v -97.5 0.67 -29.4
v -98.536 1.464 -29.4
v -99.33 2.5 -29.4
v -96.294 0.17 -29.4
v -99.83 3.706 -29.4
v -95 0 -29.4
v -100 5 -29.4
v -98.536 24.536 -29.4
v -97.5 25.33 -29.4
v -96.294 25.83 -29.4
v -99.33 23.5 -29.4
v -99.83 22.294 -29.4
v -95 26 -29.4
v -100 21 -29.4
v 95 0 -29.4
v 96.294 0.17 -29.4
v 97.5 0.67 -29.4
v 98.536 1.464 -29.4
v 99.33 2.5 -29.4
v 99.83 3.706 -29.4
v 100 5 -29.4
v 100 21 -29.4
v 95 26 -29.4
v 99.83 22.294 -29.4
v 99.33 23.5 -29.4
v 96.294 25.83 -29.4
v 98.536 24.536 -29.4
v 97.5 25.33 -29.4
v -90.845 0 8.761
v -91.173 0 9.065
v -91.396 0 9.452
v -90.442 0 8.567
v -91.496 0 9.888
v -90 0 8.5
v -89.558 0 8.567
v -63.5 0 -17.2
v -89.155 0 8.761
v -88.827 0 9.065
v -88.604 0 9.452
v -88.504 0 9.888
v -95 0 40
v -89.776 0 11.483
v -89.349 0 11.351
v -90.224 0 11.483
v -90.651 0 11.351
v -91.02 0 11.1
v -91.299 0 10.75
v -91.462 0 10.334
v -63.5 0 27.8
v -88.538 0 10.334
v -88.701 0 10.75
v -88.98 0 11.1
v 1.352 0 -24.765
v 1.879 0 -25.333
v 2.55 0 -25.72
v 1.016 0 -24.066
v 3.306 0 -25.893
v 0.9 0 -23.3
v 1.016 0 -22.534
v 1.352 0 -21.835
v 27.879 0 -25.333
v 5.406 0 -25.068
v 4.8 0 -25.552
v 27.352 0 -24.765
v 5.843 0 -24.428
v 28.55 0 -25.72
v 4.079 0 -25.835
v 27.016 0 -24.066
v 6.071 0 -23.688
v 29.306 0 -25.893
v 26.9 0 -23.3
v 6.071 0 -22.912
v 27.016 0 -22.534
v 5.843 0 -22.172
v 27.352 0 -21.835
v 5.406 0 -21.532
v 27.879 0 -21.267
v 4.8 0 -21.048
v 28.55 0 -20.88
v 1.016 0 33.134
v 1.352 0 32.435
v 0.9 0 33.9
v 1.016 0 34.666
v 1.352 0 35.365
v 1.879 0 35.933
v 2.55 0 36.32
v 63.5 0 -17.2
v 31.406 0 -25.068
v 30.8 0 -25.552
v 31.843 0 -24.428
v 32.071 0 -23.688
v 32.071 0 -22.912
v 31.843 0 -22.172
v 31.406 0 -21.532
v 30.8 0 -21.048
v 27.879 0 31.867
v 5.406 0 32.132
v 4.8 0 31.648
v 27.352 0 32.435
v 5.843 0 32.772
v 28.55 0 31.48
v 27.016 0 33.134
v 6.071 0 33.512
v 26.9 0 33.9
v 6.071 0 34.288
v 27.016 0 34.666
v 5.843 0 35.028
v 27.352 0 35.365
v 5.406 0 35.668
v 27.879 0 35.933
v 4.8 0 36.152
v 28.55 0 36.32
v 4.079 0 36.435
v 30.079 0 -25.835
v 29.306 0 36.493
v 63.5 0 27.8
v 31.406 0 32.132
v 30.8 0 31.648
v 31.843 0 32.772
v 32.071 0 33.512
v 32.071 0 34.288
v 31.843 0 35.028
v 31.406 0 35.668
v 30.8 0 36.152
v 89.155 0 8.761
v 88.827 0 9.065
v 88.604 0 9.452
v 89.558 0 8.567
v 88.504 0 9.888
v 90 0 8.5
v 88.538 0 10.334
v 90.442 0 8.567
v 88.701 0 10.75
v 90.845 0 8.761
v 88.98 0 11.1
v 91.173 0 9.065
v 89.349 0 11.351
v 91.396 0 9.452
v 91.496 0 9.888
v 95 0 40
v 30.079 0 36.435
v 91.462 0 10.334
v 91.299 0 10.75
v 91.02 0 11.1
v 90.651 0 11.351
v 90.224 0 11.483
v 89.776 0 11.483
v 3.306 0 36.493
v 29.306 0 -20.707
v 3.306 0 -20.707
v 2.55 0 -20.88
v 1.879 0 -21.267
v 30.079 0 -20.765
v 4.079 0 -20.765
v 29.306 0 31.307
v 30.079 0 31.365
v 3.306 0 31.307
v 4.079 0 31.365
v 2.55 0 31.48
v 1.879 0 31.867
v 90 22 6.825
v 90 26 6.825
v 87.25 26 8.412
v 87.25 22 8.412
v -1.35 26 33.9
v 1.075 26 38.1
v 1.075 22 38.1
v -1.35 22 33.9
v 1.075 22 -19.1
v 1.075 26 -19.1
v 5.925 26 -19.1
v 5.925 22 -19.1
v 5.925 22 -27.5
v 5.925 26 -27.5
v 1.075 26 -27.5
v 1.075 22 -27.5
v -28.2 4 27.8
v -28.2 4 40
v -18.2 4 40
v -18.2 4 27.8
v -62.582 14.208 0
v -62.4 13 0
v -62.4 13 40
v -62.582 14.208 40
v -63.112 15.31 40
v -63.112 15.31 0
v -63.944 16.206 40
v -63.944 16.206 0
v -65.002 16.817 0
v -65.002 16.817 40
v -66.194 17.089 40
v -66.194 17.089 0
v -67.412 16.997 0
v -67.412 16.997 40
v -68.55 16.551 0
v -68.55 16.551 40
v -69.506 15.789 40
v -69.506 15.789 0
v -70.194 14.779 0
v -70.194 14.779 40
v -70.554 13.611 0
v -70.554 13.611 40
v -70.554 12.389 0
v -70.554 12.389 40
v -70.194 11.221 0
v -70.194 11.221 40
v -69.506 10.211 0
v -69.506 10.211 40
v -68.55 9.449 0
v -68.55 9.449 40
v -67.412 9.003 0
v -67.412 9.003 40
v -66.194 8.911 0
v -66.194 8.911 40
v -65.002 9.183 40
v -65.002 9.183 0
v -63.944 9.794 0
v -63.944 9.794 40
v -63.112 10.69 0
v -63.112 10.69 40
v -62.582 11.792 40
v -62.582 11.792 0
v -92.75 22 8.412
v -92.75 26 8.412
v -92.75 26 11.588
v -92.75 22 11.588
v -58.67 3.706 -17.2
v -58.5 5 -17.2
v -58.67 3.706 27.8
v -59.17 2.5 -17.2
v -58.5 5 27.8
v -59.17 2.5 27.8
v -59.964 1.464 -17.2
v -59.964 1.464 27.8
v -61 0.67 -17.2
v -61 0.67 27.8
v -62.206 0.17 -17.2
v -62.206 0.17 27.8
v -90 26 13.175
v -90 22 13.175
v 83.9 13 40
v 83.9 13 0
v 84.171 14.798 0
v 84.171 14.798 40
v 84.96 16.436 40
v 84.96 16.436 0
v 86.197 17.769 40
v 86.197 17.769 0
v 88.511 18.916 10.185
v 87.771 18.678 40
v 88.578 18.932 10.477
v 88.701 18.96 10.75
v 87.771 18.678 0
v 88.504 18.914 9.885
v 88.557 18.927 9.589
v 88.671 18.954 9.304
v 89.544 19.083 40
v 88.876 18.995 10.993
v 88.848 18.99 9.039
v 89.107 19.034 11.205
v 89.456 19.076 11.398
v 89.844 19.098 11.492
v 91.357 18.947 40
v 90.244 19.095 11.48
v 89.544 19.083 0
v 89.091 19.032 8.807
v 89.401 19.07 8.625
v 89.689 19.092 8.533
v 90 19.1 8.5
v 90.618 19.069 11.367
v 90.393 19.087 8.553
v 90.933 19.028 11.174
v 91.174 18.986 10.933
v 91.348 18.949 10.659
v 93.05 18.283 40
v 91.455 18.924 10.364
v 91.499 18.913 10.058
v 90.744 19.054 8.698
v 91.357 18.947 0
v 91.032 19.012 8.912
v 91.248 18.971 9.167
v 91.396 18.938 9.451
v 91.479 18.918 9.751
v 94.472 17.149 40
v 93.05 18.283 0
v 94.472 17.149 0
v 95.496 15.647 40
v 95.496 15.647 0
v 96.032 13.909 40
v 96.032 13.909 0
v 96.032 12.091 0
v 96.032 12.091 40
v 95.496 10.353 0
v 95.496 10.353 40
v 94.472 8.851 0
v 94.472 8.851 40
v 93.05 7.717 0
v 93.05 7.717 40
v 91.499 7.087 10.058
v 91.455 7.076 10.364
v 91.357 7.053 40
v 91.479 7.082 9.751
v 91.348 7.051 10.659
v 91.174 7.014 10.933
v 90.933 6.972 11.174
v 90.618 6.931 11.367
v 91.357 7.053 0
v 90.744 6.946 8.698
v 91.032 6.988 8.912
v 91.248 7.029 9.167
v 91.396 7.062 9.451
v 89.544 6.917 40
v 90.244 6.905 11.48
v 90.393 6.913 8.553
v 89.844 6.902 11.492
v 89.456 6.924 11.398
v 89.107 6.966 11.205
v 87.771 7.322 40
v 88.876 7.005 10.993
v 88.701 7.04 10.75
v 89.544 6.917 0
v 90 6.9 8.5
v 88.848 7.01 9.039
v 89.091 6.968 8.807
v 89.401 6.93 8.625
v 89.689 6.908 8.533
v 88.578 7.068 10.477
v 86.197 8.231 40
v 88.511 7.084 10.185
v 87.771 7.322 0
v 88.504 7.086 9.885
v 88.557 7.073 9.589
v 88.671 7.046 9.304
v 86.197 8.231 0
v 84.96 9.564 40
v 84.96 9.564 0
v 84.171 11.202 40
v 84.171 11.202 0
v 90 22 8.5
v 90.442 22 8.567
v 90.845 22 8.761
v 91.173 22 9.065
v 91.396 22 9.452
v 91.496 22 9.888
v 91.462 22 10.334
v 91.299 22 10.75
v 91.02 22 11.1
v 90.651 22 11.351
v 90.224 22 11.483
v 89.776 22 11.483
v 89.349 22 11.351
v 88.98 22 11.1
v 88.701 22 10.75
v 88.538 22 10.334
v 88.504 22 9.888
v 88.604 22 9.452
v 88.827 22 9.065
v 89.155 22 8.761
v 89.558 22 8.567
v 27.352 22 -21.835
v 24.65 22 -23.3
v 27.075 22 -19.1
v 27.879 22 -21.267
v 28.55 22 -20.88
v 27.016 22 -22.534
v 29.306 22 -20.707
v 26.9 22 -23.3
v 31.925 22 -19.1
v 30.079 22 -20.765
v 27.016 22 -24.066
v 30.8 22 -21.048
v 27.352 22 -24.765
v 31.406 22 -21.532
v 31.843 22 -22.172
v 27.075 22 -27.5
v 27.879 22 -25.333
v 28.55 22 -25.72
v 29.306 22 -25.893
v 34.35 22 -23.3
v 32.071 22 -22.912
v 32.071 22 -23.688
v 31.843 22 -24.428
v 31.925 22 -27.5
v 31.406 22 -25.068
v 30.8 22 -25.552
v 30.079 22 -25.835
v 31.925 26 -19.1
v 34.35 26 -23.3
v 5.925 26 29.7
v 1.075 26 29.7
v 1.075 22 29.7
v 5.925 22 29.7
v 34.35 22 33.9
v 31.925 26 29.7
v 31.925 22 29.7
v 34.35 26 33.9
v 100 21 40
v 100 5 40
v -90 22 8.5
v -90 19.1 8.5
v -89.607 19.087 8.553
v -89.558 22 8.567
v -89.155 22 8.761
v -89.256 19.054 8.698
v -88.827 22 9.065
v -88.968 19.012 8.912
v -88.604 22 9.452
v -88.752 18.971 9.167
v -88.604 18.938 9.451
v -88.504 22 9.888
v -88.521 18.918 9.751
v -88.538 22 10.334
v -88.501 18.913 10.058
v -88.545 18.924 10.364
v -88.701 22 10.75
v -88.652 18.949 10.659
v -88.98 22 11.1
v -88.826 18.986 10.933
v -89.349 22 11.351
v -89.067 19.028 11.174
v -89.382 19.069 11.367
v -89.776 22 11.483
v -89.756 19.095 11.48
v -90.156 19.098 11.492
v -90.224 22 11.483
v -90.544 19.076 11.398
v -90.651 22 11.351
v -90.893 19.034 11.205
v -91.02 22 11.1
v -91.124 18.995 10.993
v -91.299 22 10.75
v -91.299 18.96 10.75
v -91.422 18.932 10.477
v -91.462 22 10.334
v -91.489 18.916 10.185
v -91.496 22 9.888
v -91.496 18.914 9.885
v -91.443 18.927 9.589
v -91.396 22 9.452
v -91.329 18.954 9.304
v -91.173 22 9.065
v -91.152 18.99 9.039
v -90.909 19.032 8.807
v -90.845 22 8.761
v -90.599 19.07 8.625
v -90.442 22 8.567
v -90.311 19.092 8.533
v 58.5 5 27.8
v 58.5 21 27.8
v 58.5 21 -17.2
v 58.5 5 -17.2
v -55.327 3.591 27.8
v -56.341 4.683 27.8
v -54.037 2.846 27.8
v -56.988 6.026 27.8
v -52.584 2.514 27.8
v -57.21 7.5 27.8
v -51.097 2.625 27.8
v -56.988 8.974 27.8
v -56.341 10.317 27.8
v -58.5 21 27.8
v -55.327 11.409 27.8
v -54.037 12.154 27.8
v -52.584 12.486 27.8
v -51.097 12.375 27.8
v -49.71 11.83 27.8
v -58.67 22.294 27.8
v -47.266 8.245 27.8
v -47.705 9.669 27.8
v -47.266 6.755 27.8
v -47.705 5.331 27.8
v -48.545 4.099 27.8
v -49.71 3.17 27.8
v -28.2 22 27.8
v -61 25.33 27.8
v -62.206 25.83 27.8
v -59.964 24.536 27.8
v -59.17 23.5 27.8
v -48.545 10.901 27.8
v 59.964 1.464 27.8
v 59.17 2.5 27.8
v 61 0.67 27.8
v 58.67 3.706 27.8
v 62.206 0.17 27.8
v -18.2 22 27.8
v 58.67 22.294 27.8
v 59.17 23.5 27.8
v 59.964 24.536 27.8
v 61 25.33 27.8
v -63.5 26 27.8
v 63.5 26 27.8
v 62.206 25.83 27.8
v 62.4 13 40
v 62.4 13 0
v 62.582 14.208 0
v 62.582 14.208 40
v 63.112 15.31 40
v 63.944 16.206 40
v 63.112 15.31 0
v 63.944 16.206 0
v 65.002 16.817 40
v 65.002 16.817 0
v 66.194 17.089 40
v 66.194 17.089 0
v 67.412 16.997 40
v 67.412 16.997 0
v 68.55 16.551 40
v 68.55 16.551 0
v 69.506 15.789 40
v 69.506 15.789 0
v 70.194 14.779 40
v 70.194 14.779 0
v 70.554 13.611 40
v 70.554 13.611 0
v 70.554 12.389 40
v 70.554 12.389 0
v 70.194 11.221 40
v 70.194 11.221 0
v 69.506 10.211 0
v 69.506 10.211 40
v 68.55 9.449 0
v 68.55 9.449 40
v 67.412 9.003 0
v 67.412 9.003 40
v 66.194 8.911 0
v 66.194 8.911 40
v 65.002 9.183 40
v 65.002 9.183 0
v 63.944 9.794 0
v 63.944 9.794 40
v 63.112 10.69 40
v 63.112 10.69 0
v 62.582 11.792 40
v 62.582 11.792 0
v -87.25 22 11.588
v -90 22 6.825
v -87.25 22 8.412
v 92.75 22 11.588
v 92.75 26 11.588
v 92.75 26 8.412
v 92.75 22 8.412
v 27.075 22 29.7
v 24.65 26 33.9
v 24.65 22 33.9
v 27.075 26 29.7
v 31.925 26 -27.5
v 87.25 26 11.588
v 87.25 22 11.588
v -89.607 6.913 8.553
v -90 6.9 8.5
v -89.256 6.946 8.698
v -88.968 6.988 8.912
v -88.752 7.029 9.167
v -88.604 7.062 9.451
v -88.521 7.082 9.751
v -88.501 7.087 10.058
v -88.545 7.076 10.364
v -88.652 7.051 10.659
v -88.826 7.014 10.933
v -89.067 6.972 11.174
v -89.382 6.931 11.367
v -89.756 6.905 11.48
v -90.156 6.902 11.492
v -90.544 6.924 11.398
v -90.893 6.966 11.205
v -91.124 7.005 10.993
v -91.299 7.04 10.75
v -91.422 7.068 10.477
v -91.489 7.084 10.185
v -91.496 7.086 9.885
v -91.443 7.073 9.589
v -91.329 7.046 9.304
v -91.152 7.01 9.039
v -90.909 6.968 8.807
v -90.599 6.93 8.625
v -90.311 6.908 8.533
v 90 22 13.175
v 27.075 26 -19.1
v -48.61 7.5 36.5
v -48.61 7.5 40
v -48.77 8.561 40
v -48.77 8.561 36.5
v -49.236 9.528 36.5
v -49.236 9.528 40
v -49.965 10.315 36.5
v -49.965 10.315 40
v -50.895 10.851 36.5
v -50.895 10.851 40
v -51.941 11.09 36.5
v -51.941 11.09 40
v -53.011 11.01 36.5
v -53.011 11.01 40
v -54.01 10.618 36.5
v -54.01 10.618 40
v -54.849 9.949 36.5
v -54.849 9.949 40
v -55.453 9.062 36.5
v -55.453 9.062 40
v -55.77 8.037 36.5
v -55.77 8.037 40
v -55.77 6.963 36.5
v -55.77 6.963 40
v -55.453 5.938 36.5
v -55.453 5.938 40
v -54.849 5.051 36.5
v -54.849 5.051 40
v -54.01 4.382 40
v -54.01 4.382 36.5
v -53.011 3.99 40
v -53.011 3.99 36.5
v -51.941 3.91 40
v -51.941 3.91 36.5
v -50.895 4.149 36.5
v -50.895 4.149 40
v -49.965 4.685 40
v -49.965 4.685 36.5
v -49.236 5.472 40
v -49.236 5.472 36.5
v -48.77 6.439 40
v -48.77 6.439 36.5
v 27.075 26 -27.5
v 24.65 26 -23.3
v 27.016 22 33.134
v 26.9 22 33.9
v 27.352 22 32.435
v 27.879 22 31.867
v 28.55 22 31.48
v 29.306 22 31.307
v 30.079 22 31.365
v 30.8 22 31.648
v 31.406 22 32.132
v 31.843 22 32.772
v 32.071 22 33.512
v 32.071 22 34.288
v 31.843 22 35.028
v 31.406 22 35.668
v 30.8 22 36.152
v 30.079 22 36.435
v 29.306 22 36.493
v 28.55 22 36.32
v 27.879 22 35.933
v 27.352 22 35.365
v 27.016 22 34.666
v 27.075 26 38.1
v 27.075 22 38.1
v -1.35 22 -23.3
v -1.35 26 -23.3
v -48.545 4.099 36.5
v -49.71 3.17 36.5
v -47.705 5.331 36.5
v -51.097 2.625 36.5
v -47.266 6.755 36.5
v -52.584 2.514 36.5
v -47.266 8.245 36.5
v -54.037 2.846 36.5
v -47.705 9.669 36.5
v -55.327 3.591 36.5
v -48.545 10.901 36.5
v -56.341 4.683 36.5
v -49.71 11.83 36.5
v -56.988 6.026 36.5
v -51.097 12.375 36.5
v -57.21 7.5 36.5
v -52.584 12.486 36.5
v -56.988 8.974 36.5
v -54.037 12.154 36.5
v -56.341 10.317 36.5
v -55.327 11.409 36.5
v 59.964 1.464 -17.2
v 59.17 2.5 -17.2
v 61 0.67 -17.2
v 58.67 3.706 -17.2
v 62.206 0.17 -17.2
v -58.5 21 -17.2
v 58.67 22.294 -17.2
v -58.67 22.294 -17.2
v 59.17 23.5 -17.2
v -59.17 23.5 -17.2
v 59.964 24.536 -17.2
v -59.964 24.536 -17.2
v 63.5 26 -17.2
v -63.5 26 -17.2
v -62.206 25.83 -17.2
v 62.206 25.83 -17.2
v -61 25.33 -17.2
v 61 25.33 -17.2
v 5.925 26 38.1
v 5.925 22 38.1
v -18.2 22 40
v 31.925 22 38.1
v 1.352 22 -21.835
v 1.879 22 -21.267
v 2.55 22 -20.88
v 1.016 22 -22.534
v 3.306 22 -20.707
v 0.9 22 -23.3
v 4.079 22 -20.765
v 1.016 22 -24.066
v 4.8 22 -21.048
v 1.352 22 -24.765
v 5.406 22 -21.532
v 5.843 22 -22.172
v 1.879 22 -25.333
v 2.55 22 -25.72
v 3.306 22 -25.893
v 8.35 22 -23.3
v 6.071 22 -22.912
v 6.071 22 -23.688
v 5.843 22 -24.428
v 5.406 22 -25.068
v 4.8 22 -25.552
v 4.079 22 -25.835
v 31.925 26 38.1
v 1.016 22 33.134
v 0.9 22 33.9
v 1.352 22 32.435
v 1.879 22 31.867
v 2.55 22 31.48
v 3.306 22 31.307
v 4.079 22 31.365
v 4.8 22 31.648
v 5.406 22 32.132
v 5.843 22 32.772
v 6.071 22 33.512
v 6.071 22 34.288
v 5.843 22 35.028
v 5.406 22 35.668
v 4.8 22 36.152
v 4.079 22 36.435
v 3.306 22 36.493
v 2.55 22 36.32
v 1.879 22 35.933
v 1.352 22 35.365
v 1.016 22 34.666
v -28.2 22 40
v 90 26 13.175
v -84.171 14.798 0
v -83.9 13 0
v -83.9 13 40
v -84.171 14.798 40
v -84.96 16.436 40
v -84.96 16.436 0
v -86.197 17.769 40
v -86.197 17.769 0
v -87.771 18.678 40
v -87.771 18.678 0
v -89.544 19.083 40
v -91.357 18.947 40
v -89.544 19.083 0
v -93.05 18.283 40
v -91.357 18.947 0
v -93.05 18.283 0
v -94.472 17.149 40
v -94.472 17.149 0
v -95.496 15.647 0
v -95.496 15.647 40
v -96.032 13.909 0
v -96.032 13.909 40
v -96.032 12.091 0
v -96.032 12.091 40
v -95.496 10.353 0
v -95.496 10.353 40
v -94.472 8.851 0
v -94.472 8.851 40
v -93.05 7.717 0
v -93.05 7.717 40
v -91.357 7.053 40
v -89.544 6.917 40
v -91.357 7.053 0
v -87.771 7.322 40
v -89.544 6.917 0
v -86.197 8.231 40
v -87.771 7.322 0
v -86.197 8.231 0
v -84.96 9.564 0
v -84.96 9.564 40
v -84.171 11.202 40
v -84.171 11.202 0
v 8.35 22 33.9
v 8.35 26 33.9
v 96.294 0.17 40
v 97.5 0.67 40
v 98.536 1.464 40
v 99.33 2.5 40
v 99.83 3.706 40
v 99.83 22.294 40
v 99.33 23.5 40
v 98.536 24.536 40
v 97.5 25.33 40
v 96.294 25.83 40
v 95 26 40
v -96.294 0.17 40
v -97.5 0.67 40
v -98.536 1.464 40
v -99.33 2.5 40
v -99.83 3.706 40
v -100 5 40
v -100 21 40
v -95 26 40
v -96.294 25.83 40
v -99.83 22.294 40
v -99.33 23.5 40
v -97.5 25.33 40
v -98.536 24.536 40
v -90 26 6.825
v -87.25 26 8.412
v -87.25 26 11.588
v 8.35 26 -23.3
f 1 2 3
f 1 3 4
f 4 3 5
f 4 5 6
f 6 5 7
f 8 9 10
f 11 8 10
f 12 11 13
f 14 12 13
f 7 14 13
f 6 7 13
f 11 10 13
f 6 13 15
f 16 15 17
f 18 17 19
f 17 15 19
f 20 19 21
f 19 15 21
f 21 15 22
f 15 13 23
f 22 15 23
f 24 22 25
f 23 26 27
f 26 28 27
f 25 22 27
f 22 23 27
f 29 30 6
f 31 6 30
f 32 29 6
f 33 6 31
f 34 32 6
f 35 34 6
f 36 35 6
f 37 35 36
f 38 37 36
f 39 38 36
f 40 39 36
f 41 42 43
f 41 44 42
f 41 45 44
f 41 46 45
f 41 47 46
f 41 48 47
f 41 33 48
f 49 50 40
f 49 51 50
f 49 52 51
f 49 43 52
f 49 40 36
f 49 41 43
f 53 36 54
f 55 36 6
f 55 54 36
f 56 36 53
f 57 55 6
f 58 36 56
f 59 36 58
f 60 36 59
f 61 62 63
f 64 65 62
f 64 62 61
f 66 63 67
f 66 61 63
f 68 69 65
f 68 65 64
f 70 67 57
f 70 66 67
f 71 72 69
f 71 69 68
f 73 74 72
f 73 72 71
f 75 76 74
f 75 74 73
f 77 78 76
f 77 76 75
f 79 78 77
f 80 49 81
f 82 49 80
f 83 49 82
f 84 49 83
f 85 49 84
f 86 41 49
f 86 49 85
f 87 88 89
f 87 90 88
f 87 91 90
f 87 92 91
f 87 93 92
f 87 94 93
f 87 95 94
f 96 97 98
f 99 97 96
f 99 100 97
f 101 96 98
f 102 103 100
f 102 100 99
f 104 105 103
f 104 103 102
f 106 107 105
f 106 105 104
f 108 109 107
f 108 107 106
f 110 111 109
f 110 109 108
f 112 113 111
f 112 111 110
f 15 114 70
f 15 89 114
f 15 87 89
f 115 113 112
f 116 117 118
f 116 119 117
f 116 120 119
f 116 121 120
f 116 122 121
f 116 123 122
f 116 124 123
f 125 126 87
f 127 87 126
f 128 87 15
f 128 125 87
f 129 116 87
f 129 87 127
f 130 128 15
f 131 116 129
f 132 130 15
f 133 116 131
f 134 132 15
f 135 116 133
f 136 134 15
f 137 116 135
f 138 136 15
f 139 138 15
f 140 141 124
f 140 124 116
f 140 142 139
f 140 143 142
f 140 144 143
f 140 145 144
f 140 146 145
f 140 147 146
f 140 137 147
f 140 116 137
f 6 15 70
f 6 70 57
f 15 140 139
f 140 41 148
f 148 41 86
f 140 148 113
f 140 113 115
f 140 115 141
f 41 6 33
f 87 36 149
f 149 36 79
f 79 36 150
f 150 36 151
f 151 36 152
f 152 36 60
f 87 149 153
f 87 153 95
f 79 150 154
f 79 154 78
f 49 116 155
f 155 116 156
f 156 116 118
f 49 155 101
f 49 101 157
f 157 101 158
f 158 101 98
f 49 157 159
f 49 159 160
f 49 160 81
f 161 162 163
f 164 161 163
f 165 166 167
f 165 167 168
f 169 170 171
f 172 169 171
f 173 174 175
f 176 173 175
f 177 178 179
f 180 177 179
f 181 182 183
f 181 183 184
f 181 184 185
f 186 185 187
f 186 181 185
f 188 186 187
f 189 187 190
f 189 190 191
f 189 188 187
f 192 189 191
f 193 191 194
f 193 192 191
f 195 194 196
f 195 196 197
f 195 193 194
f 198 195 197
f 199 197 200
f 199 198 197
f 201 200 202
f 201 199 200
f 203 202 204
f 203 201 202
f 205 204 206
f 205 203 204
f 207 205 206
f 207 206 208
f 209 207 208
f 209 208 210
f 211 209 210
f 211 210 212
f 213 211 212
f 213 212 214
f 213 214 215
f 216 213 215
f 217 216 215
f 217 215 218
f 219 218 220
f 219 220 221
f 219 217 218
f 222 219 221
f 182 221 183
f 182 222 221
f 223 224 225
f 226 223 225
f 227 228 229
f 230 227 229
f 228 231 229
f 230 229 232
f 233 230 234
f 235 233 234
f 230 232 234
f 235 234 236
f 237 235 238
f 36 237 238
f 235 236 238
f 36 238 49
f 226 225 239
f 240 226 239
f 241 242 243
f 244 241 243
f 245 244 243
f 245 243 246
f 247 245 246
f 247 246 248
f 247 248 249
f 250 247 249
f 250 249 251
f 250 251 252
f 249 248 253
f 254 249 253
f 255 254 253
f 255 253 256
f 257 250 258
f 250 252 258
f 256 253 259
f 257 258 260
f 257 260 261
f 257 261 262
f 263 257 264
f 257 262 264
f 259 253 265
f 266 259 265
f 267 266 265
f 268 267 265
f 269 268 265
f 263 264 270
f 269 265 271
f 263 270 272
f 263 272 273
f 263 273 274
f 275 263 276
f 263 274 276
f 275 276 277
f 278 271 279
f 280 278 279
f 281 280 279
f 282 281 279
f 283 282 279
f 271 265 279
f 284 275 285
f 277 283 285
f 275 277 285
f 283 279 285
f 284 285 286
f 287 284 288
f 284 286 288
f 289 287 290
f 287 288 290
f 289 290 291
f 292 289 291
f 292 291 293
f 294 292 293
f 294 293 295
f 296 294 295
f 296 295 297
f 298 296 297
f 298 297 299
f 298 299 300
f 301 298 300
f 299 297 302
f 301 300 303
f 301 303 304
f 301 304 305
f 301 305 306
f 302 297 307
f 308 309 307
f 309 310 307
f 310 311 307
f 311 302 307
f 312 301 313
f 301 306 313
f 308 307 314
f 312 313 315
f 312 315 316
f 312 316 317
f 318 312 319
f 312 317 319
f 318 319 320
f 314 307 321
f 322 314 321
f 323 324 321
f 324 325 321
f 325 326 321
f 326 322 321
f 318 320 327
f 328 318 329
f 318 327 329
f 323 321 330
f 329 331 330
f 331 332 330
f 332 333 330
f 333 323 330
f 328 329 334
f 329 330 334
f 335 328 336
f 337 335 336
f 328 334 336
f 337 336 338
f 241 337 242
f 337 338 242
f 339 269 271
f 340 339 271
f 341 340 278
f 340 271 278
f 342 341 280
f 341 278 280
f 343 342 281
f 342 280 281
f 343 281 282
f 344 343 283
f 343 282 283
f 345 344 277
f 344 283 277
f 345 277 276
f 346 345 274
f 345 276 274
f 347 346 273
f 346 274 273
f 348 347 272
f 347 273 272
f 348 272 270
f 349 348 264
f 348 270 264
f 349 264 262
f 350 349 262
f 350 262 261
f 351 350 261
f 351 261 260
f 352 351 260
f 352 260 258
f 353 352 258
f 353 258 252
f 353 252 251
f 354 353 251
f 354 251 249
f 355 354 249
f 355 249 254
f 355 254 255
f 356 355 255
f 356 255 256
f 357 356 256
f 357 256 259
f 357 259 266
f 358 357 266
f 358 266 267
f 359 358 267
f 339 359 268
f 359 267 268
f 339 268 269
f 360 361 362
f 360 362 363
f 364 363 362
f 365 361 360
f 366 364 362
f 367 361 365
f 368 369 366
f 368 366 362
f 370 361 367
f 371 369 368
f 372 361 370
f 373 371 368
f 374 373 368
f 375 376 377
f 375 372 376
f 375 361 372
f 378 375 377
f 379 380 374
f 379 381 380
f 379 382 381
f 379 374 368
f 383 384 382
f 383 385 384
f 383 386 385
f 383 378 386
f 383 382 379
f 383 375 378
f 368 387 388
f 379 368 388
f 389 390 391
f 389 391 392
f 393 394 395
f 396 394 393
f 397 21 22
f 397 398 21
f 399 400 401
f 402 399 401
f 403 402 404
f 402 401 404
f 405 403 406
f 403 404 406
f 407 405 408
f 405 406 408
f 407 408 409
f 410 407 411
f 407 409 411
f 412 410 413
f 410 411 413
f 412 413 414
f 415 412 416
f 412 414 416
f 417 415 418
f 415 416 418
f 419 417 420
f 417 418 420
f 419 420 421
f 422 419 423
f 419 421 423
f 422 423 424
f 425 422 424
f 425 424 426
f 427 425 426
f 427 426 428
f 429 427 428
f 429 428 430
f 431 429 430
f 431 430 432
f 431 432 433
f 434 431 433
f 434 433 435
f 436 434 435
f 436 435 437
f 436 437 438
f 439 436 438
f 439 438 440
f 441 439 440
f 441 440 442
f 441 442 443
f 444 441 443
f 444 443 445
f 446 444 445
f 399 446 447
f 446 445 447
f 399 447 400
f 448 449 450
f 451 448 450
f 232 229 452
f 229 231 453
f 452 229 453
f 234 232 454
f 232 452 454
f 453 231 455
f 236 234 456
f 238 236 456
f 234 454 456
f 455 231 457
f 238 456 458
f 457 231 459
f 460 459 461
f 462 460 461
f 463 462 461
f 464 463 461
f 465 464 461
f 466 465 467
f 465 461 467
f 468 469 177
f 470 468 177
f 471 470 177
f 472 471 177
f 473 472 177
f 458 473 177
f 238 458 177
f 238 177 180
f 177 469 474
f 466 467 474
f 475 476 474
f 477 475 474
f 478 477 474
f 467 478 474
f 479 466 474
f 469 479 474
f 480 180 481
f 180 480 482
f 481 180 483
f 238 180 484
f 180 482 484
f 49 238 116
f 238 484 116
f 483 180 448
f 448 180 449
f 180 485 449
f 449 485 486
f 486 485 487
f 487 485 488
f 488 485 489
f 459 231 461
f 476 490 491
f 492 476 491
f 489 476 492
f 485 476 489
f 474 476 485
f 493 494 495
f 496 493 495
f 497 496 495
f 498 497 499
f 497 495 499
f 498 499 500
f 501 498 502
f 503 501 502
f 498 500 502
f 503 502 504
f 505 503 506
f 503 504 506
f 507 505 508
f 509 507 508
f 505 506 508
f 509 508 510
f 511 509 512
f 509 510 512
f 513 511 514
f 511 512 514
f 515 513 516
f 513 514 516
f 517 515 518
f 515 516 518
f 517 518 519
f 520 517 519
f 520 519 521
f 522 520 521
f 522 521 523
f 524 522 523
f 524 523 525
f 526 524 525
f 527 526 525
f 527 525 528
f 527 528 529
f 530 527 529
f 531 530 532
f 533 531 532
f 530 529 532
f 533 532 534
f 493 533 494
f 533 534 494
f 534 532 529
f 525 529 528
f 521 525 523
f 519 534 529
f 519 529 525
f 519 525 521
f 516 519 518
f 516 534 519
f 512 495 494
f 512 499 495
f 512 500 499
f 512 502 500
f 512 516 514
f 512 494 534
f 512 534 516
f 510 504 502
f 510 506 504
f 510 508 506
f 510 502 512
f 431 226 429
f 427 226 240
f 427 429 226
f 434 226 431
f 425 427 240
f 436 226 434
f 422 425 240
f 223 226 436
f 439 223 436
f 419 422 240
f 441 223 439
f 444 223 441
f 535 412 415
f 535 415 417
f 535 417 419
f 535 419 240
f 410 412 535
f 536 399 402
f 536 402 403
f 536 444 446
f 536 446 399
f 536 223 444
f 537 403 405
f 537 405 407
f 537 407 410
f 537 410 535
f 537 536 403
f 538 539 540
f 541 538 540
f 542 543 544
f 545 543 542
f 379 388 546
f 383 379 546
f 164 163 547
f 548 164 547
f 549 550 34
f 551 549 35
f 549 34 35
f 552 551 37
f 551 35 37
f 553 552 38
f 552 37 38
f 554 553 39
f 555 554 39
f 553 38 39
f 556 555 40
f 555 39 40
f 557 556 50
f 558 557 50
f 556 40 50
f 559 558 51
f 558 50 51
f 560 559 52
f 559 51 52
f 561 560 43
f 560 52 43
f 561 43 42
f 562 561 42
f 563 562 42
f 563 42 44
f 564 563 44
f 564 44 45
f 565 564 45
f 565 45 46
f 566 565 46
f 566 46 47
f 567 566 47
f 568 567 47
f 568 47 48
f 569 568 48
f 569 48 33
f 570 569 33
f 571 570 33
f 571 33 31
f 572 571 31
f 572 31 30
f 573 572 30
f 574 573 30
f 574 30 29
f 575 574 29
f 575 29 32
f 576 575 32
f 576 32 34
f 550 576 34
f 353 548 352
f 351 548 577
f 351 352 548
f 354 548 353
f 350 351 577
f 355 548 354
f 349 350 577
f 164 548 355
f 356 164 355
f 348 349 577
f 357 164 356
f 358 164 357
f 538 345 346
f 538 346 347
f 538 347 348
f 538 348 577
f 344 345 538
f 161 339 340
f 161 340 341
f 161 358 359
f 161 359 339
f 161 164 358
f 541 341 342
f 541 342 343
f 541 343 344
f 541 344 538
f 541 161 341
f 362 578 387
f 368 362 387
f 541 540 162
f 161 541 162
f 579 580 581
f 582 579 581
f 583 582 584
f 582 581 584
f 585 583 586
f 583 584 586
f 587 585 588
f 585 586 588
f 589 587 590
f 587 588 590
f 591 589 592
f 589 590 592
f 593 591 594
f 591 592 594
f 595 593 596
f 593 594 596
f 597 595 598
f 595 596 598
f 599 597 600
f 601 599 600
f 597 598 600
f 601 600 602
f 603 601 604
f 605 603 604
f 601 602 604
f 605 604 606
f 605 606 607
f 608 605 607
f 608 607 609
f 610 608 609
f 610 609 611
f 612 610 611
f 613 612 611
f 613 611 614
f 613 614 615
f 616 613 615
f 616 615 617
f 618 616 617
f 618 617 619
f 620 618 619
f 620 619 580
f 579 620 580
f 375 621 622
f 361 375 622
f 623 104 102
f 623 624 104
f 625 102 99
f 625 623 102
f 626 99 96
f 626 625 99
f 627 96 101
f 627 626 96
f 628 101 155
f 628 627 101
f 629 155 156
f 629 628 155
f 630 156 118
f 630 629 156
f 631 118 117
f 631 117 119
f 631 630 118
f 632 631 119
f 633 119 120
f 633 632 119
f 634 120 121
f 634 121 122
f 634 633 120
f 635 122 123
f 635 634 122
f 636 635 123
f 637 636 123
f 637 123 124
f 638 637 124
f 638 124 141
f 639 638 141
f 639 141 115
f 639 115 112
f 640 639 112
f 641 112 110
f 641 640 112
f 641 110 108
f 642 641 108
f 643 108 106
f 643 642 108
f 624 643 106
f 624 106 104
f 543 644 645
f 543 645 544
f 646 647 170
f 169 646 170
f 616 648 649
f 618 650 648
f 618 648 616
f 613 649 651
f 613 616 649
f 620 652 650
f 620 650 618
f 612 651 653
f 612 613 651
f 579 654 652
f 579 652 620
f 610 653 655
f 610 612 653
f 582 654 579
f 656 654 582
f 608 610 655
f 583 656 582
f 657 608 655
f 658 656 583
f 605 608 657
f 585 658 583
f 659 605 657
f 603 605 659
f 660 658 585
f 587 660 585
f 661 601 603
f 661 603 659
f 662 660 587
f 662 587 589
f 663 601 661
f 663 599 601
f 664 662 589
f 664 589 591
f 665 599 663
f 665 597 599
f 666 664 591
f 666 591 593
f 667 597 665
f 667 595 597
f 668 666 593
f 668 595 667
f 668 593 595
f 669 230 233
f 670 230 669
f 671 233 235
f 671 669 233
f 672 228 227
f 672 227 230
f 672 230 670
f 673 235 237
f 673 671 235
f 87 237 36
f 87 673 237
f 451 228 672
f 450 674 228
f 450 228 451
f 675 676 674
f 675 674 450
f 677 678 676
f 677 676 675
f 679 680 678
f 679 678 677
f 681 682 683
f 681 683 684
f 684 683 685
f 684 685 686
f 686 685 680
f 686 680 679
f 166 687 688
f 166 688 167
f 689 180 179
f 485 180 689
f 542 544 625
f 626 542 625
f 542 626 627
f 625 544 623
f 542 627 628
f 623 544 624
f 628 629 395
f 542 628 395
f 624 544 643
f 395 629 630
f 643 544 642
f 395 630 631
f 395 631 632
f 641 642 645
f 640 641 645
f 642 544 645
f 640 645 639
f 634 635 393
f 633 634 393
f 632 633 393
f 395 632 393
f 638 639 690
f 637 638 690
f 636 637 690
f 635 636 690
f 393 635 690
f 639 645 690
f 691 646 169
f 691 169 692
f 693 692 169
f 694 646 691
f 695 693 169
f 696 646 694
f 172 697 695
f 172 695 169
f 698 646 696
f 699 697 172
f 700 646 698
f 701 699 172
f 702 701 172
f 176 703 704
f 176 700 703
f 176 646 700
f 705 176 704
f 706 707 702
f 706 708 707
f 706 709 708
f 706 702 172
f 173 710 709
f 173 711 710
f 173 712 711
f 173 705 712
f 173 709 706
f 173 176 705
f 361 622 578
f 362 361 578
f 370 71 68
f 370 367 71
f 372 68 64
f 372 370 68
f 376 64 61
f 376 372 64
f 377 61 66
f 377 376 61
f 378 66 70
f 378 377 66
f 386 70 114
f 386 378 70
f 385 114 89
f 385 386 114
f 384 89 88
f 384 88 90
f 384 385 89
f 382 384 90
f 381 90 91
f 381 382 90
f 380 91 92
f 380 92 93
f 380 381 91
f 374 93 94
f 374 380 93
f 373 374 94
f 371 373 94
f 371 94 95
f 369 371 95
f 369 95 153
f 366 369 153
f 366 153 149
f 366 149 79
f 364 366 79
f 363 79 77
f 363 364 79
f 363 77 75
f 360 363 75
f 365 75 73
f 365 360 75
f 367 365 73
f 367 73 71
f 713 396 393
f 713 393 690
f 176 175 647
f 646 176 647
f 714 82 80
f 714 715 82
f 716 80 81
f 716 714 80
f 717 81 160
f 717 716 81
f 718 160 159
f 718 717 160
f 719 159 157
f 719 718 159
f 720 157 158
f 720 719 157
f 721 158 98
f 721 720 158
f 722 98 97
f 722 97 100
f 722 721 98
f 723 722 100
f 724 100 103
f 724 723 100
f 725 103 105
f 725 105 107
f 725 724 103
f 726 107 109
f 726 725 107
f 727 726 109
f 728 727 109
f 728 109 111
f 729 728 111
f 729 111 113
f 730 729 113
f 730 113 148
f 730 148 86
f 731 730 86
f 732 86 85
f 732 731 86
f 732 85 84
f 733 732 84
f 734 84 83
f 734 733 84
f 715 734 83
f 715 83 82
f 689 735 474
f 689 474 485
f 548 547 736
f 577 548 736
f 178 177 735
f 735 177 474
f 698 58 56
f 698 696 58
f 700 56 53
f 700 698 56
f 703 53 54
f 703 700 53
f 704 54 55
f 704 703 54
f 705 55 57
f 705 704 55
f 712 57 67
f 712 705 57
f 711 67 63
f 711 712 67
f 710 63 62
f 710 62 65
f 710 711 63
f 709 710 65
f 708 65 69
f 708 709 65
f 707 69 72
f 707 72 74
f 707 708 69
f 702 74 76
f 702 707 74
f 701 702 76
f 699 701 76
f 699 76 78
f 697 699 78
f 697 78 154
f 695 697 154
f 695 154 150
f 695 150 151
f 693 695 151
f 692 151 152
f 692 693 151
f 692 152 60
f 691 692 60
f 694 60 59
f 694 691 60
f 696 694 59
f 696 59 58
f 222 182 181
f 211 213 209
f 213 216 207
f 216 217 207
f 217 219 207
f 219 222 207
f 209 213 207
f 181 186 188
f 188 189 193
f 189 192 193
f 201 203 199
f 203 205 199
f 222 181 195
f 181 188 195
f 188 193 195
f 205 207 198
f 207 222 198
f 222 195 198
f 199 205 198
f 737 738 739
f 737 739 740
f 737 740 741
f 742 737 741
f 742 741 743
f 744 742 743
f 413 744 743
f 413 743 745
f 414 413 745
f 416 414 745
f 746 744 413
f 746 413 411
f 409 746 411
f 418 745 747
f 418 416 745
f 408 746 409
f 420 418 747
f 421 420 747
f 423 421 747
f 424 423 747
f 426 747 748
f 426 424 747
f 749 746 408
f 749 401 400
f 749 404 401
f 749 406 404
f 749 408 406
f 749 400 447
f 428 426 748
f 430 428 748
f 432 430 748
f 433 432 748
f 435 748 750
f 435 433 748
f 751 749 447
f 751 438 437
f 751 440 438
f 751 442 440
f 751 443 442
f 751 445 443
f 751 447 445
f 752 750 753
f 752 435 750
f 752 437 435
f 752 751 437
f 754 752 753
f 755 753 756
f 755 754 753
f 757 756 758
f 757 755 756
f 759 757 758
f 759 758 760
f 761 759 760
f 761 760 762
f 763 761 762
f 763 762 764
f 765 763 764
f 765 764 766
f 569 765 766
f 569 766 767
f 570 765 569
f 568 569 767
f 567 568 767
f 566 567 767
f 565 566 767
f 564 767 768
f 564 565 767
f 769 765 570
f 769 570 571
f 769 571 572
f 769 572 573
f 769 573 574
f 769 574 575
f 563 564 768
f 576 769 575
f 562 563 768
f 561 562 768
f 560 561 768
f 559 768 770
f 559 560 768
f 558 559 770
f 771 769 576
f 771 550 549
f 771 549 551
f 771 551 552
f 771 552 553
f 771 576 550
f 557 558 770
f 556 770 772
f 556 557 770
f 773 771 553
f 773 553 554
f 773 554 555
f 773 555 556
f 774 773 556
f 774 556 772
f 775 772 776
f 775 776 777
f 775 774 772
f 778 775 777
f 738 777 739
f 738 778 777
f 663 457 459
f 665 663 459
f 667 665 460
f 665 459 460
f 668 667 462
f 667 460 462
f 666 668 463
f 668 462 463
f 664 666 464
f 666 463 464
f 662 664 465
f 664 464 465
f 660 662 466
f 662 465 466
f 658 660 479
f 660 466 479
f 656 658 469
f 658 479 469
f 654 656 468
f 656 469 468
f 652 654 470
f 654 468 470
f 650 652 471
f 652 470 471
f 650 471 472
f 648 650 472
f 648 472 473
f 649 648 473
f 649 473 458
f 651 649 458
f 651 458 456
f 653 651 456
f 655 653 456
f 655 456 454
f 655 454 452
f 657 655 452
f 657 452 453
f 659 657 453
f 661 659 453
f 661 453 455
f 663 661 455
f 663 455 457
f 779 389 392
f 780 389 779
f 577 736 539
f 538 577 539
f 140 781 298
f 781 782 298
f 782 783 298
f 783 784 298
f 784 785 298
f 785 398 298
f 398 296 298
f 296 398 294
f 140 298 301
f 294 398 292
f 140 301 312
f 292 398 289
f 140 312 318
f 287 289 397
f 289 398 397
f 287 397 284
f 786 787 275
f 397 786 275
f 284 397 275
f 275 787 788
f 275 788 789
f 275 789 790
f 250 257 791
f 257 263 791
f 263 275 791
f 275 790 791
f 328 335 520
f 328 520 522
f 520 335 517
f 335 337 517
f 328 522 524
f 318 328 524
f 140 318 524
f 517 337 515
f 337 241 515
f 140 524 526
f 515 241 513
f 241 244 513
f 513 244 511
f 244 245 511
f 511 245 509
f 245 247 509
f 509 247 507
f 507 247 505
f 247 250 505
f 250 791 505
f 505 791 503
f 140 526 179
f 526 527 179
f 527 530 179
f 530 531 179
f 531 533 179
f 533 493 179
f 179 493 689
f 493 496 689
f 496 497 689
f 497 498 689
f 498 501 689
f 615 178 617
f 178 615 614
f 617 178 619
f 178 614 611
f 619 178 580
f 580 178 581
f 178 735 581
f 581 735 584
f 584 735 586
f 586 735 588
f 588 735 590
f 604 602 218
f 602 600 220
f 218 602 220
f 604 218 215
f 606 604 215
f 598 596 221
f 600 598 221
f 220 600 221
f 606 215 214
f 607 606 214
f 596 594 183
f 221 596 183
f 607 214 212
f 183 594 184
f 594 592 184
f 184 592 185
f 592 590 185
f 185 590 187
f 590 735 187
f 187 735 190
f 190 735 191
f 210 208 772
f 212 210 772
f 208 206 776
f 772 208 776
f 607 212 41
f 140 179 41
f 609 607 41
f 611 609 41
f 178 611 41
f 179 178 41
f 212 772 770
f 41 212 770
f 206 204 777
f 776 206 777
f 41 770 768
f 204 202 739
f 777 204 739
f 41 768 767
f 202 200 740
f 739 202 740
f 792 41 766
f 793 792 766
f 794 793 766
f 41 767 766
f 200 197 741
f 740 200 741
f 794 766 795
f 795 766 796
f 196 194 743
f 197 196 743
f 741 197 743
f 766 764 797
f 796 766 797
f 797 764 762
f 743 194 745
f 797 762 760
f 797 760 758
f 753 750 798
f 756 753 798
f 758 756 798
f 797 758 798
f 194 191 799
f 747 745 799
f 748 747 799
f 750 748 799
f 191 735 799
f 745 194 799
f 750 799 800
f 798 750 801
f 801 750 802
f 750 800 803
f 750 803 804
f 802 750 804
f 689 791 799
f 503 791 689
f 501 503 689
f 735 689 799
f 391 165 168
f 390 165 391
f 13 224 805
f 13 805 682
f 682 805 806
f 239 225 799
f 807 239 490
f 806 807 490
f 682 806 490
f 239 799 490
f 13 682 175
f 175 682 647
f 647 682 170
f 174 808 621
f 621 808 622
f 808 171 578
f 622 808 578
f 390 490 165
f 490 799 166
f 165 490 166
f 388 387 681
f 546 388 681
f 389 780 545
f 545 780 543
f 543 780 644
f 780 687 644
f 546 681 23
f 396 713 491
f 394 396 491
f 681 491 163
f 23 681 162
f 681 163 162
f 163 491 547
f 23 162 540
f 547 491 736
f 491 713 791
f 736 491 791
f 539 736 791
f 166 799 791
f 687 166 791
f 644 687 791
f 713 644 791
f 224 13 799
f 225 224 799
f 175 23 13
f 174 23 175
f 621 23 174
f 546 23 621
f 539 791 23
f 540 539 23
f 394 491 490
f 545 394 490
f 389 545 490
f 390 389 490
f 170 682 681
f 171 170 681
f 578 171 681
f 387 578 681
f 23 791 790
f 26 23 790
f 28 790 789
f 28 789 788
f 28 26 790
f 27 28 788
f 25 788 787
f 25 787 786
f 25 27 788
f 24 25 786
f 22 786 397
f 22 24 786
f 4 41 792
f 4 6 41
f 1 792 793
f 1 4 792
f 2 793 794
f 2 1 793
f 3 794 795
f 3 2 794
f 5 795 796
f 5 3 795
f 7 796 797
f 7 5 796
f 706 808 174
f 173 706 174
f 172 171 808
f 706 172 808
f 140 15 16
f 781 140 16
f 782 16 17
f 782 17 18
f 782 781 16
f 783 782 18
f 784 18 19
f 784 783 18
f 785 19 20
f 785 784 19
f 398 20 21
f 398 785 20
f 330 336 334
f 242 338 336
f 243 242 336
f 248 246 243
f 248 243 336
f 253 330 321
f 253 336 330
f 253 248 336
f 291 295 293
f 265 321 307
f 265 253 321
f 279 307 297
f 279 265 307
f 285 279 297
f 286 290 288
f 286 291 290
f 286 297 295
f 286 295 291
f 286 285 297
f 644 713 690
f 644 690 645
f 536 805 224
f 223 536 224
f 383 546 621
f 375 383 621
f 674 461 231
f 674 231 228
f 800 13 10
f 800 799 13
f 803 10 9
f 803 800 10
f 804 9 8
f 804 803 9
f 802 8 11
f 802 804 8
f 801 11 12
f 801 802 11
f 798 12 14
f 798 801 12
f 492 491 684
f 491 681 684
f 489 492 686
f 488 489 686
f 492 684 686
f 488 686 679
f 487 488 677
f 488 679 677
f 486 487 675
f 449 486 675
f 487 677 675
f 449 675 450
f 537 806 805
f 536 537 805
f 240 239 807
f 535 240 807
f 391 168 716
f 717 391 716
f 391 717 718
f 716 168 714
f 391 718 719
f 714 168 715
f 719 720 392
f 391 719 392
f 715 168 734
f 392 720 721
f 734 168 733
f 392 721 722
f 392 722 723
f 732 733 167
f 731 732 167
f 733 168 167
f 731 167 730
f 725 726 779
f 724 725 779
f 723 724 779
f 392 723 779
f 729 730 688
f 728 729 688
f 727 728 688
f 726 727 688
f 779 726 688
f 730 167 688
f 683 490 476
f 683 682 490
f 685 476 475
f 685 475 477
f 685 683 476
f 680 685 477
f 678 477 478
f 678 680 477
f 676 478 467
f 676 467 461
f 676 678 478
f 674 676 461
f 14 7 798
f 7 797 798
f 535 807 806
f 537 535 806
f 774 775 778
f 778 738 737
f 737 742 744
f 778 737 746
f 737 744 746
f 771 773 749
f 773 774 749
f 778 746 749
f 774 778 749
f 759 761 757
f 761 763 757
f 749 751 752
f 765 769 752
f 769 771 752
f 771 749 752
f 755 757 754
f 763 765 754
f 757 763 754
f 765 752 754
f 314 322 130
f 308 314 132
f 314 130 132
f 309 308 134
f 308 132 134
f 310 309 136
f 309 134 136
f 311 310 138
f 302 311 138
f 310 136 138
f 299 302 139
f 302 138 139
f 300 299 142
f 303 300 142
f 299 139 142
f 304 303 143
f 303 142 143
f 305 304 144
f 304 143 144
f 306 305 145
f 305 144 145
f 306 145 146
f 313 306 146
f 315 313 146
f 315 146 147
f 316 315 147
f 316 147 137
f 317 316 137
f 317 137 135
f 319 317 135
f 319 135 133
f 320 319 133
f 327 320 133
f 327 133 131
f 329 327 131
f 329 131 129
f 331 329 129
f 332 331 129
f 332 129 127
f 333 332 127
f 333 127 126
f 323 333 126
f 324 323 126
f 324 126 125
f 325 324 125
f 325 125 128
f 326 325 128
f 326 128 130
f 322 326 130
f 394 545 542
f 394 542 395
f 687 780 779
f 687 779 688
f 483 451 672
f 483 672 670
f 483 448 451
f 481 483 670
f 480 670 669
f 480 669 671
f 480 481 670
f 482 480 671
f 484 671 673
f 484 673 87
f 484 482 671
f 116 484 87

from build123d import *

# Parameters (mm, degrees)
SKETCH1_W           = 100
SKETCH1_H           = 26
SKETCH1_R           = 6.1
SKETCH1_R_2         = 4.1
BOSS_EXTRUDE1_DEPTH = 40
SKETCH2_W           = 100
SKETCH2_H           = 26
BOSS_EXTRUDE2_DEPTH = 29.4
CUT_EXTRUDE1_REACH  = 112.797
SKETCH3_W           = 58.5
SKETCH3_H           = 45
SKETCH4_R           = 2.6
CUT_EXTRUDE2_DEPTH  = 111.797111876
CUT_EXTRUDE3_DEPTH  = 4
CUT_EXTRUDE4_START  = -12.2
SKETCH6_W           = 10
SKETCH6_H           = 18
CUT_EXTRUDE4_DEPTH  = 12.2
FILLET1_R           = 5
CUT_EXTRUDE5_DEPTH  = 4
SKETCH8_R           = 2.6
BOSS_EXTRUDE3_DEPTH = 4
SKETCH9_R           = 2.6
BOSS_EXTRUDE4_DEPTH = 4
SKETCH10_R          = 1.5
CUT_EXTRUDE6_DEPTH  = 111.797111876
CUT_EXTRUDE7_DEPTH  = 4
HOLE1_D             = 7.2
HOLE1_DEPTH         = 12.2
HOLE1_CBORE_D       = 10
HOLE1_CBORE_DEPTH   = 8.7


with BuildPart() as part:
    # Sketch1 → Boss-Extrude1 (new body)
    with BuildSketch(Plane.XY):
        with Locations((-50, 13)):
            Rectangle(SKETCH1_W, SKETCH1_H)
        with Locations((-90, 13)):
            Circle(SKETCH1_R, mode=Mode.SUBTRACT)
        with Locations((-66.5, 13)):
            Circle(SKETCH1_R_2, mode=Mode.SUBTRACT)
    boss_extrude1 = extrude(amount=BOSS_EXTRUDE1_DEPTH)

    # Sketch2 → Boss-Extrude2 (add)
    with BuildSketch(Plane(origin=(0, 0, 0), x_dir=(-1, 0, 0), z_dir=(0, 0, -1))):
        with Locations((50, 13)):
            Rectangle(SKETCH2_W, SKETCH2_H)
    boss_extrude2 = extrude(amount=BOSS_EXTRUDE2_DEPTH)

    # Sketch3 → Cut-Extrude1 (cut, up to next)
    with BuildSketch(Plane(origin=(0, 26, 0), x_dir=(1, 0, 0), z_dir=(0, 1, 0)), mode=Mode.PRIVATE) as cut_extrude1_sk1:
        with Locations((-29.25, -5.3)):
            Rectangle(SKETCH3_W, SKETCH3_H)
    cut_extrude1_tool1 = extrude(cut_extrude1_sk1.sketch, amount=-CUT_EXTRUDE1_REACH, mode=Mode.PRIVATE) & part.part
    cut_extrude1 = cut_extrude1_tool1.solids().sort_by_distance((-29.25, 26, 5.3))[0]
    add(cut_extrude1, mode=Mode.SUBTRACT)

    # Mirror2: Boss-Extrude1, Boss-Extrude2, Cut-Extrude1 across plane
    add(boss_extrude1.mirror(Plane(origin=(0, 0, 40), x_dir=(0, 0, 1), z_dir=(-1, 0, 0))))
    add(boss_extrude2.mirror(Plane(origin=(0, 0, 40), x_dir=(0, 0, 1), z_dir=(-1, 0, 0))))
    add(cut_extrude1.mirror(Plane(origin=(0, 0, 40), x_dir=(0, 0, 1), z_dir=(-1, 0, 0))), mode=Mode.SUBTRACT)

    # Sketch4 → Cut-Extrude2 (cut, through all)
    with BuildSketch(Plane(origin=(0, 26, 0), x_dir=(1, 0, 0), z_dir=(0, 1, 0))):
        with Locations(Location((3.5, 23.3, 0), (0, 0, 180))):
            Circle(SKETCH4_R)
        with Locations(Location((29.5, 23.3, 0), (0, 0, 180))):
            Circle(SKETCH4_R)
    cut_extrude2 = extrude(amount=-CUT_EXTRUDE2_DEPTH, mode=Mode.SUBTRACT)

    # Sketch5 → Cut-Extrude3 (cut)
    with BuildSketch(Plane.XZ):
        Polygon((34.234272207, -23.3), (31.867136104, -19.2), (27.132863896, -19.2), (24.765727793, -23.3), (27.132863896, -27.4), (31.867136104, -27.4), align=None)
        Polygon((-1.234272207, -23.3), (1.132863896, -27.4), (5.867136104, -27.4), (8.234272207, -23.3), (5.867136104, -19.2), (1.132863896, -19.2), align=None)
    cut_extrude3 = extrude(amount=-CUT_EXTRUDE3_DEPTH, mode=Mode.SUBTRACT)

    # Mirror3: Cut-Extrude2, Cut-Extrude3 across plane
    add(cut_extrude2.mirror(Plane.XY.offset(5.3)), mode=Mode.SUBTRACT)
    add(cut_extrude3.mirror(Plane.XY.offset(5.3)), mode=Mode.SUBTRACT)

    # Sketch6 → Cut-Extrude4 (cut)
    with BuildSketch(Plane.XY.offset(40).offset(CUT_EXTRUDE4_START)):
        with Locations((-23.2, 13)):
            Rectangle(SKETCH6_W, SKETCH6_H)
    extrude(amount=CUT_EXTRUDE4_DEPTH, mode=Mode.SUBTRACT)

    # Fillet1
    fillet1_edges = [part.edges().sort_by_distance(p)[0] for p in [
        (-58.5, 26, 5.3),
        (-58.5, 0, 5.3),
        (100, 0, 5.3),
        (100, 26, 5.3),
        (-100, 0, 5.3),
        (-100, 26, 5.3),
        (58.5, 0, 5.3),
        (58.5, 26, 5.3),
    ]]
    fillet(fillet1_edges, radius=FILLET1_R)

    # Sketch7 → Cut-Extrude5 (cut)
    with BuildSketch(Plane(origin=(0, 26, 0), x_dir=(1, 0, 0), z_dir=(0, 1, 0))):
        Polygon((8.349742261, 23.3), (5.924871131, 27.5), (1.075128869, 27.5), (-1.349742261, 23.3), (1.075128869, 19.1), (5.924871131, 19.1), align=None)
        Polygon((34.349742261, 23.3), (31.924871131, 27.5), (27.075128869, 27.5), (24.650257739, 23.3), (27.075128869, 19.1), (31.924871131, 19.1), align=None)
    cut_extrude5 = extrude(amount=-CUT_EXTRUDE5_DEPTH, mode=Mode.SUBTRACT)

    # Mirror4: Cut-Extrude5 across plane
    add(cut_extrude5.mirror(Plane.XY.offset(5.3)), mode=Mode.SUBTRACT)

    # Sketch8 → Boss-Extrude3 (add)
    # profile 1 of 2: a face of its own
    with BuildSketch(Plane.XZ.offset(-4)):
        Polygon((27.132863896, 38), (31.867136104, 38), (34.234272207, 33.9), (31.867136104, 29.8), (27.132863896, 29.8), (24.765727793, 33.9), align=None)
        with Locations(Location((29.5, 33.9, 0), (0, 0, 180))):
            Circle(SKETCH8_R, mode=Mode.SUBTRACT)
    # profile 2 of 2: a face of its own
    with BuildSketch(Plane.XZ.offset(-4)):
        Polygon((1.132863896, 38), (5.867136104, 38), (8.234272207, 33.9), (5.867136104, 29.8), (1.132863896, 29.8), (-1.234272207, 33.9), align=None)
        with Locations(Location((3.5, 33.9, 0), (0, 0, 180))):
            Circle(SKETCH8_R, mode=Mode.SUBTRACT)
    extrude(amount=BOSS_EXTRUDE3_DEPTH)

    # Sketch9 → Boss-Extrude4 (add)
    # profile 1 of 2: a face of its own
    with BuildSketch(Plane.XZ.offset(-4)):
        Polygon((31.867136104, -19.2), (27.132863896, -19.2), (24.765727793, -23.3), (27.132863896, -27.4), (31.867136104, -27.4), (34.234272207, -23.3), align=None)
        with Locations(Location((29.5, -23.3, 0), (0, 0, 180))):
            Circle(SKETCH9_R, mode=Mode.SUBTRACT)
    # profile 2 of 2: a face of its own
    with BuildSketch(Plane.XZ.offset(-4)):
        Polygon((1.132863896, -19.2), (-1.234272207, -23.3), (1.132863896, -27.4), (5.867136104, -27.4), (8.234272207, -23.3), (5.867136104, -19.2), align=None)
        with Locations(Location((3.5, -23.3, 0), (0, 0, 180))):
            Circle(SKETCH9_R, mode=Mode.SUBTRACT)
    extrude(amount=BOSS_EXTRUDE4_DEPTH)

    # Sketch10 → Cut-Extrude6 (cut, through all)
    with BuildSketch(Plane.XZ):
        with Locations(Location((-90, 10, 0), (0, 0, 270))):
            Circle(SKETCH10_R)
        with Locations(Location((90, 10, 0), (0, 0, 270))):
            Circle(SKETCH10_R)
    extrude(amount=-CUT_EXTRUDE6_DEPTH, mode=Mode.SUBTRACT)

    # Sketch11 → Cut-Extrude7 (cut)
    with BuildSketch(Plane(origin=(0, 26, 0), x_dir=(1, 0, 0), z_dir=(0, 1, 0))):
        Polygon((-90, -13.175426481), (-87.25, -11.58771324), (-87.25, -8.41228676), (-90, -6.824573519), (-92.75, -8.41228676), (-92.75, -11.58771324), align=None)
        Polygon((90, -13.175426481), (92.75, -11.58771324), (92.75, -8.41228676), (90, -6.824573519), (87.25, -8.41228676), (87.25, -11.58771324), align=None)
    extrude(amount=-CUT_EXTRUDE7_DEPTH, mode=Mode.SUBTRACT)

    # Hole1
    with Locations(Plane(origin=(-52.21, 7.5, 27.8), x_dir=(-1, 0, 0), z_dir=(0, 0, -1))):
        with Locations((0, 0)):
            CounterBoreHole(HOLE1_D / 2, HOLE1_CBORE_D / 2, HOLE1_CBORE_DEPTH, depth=HOLE1_DEPTH)


solid = part.part
